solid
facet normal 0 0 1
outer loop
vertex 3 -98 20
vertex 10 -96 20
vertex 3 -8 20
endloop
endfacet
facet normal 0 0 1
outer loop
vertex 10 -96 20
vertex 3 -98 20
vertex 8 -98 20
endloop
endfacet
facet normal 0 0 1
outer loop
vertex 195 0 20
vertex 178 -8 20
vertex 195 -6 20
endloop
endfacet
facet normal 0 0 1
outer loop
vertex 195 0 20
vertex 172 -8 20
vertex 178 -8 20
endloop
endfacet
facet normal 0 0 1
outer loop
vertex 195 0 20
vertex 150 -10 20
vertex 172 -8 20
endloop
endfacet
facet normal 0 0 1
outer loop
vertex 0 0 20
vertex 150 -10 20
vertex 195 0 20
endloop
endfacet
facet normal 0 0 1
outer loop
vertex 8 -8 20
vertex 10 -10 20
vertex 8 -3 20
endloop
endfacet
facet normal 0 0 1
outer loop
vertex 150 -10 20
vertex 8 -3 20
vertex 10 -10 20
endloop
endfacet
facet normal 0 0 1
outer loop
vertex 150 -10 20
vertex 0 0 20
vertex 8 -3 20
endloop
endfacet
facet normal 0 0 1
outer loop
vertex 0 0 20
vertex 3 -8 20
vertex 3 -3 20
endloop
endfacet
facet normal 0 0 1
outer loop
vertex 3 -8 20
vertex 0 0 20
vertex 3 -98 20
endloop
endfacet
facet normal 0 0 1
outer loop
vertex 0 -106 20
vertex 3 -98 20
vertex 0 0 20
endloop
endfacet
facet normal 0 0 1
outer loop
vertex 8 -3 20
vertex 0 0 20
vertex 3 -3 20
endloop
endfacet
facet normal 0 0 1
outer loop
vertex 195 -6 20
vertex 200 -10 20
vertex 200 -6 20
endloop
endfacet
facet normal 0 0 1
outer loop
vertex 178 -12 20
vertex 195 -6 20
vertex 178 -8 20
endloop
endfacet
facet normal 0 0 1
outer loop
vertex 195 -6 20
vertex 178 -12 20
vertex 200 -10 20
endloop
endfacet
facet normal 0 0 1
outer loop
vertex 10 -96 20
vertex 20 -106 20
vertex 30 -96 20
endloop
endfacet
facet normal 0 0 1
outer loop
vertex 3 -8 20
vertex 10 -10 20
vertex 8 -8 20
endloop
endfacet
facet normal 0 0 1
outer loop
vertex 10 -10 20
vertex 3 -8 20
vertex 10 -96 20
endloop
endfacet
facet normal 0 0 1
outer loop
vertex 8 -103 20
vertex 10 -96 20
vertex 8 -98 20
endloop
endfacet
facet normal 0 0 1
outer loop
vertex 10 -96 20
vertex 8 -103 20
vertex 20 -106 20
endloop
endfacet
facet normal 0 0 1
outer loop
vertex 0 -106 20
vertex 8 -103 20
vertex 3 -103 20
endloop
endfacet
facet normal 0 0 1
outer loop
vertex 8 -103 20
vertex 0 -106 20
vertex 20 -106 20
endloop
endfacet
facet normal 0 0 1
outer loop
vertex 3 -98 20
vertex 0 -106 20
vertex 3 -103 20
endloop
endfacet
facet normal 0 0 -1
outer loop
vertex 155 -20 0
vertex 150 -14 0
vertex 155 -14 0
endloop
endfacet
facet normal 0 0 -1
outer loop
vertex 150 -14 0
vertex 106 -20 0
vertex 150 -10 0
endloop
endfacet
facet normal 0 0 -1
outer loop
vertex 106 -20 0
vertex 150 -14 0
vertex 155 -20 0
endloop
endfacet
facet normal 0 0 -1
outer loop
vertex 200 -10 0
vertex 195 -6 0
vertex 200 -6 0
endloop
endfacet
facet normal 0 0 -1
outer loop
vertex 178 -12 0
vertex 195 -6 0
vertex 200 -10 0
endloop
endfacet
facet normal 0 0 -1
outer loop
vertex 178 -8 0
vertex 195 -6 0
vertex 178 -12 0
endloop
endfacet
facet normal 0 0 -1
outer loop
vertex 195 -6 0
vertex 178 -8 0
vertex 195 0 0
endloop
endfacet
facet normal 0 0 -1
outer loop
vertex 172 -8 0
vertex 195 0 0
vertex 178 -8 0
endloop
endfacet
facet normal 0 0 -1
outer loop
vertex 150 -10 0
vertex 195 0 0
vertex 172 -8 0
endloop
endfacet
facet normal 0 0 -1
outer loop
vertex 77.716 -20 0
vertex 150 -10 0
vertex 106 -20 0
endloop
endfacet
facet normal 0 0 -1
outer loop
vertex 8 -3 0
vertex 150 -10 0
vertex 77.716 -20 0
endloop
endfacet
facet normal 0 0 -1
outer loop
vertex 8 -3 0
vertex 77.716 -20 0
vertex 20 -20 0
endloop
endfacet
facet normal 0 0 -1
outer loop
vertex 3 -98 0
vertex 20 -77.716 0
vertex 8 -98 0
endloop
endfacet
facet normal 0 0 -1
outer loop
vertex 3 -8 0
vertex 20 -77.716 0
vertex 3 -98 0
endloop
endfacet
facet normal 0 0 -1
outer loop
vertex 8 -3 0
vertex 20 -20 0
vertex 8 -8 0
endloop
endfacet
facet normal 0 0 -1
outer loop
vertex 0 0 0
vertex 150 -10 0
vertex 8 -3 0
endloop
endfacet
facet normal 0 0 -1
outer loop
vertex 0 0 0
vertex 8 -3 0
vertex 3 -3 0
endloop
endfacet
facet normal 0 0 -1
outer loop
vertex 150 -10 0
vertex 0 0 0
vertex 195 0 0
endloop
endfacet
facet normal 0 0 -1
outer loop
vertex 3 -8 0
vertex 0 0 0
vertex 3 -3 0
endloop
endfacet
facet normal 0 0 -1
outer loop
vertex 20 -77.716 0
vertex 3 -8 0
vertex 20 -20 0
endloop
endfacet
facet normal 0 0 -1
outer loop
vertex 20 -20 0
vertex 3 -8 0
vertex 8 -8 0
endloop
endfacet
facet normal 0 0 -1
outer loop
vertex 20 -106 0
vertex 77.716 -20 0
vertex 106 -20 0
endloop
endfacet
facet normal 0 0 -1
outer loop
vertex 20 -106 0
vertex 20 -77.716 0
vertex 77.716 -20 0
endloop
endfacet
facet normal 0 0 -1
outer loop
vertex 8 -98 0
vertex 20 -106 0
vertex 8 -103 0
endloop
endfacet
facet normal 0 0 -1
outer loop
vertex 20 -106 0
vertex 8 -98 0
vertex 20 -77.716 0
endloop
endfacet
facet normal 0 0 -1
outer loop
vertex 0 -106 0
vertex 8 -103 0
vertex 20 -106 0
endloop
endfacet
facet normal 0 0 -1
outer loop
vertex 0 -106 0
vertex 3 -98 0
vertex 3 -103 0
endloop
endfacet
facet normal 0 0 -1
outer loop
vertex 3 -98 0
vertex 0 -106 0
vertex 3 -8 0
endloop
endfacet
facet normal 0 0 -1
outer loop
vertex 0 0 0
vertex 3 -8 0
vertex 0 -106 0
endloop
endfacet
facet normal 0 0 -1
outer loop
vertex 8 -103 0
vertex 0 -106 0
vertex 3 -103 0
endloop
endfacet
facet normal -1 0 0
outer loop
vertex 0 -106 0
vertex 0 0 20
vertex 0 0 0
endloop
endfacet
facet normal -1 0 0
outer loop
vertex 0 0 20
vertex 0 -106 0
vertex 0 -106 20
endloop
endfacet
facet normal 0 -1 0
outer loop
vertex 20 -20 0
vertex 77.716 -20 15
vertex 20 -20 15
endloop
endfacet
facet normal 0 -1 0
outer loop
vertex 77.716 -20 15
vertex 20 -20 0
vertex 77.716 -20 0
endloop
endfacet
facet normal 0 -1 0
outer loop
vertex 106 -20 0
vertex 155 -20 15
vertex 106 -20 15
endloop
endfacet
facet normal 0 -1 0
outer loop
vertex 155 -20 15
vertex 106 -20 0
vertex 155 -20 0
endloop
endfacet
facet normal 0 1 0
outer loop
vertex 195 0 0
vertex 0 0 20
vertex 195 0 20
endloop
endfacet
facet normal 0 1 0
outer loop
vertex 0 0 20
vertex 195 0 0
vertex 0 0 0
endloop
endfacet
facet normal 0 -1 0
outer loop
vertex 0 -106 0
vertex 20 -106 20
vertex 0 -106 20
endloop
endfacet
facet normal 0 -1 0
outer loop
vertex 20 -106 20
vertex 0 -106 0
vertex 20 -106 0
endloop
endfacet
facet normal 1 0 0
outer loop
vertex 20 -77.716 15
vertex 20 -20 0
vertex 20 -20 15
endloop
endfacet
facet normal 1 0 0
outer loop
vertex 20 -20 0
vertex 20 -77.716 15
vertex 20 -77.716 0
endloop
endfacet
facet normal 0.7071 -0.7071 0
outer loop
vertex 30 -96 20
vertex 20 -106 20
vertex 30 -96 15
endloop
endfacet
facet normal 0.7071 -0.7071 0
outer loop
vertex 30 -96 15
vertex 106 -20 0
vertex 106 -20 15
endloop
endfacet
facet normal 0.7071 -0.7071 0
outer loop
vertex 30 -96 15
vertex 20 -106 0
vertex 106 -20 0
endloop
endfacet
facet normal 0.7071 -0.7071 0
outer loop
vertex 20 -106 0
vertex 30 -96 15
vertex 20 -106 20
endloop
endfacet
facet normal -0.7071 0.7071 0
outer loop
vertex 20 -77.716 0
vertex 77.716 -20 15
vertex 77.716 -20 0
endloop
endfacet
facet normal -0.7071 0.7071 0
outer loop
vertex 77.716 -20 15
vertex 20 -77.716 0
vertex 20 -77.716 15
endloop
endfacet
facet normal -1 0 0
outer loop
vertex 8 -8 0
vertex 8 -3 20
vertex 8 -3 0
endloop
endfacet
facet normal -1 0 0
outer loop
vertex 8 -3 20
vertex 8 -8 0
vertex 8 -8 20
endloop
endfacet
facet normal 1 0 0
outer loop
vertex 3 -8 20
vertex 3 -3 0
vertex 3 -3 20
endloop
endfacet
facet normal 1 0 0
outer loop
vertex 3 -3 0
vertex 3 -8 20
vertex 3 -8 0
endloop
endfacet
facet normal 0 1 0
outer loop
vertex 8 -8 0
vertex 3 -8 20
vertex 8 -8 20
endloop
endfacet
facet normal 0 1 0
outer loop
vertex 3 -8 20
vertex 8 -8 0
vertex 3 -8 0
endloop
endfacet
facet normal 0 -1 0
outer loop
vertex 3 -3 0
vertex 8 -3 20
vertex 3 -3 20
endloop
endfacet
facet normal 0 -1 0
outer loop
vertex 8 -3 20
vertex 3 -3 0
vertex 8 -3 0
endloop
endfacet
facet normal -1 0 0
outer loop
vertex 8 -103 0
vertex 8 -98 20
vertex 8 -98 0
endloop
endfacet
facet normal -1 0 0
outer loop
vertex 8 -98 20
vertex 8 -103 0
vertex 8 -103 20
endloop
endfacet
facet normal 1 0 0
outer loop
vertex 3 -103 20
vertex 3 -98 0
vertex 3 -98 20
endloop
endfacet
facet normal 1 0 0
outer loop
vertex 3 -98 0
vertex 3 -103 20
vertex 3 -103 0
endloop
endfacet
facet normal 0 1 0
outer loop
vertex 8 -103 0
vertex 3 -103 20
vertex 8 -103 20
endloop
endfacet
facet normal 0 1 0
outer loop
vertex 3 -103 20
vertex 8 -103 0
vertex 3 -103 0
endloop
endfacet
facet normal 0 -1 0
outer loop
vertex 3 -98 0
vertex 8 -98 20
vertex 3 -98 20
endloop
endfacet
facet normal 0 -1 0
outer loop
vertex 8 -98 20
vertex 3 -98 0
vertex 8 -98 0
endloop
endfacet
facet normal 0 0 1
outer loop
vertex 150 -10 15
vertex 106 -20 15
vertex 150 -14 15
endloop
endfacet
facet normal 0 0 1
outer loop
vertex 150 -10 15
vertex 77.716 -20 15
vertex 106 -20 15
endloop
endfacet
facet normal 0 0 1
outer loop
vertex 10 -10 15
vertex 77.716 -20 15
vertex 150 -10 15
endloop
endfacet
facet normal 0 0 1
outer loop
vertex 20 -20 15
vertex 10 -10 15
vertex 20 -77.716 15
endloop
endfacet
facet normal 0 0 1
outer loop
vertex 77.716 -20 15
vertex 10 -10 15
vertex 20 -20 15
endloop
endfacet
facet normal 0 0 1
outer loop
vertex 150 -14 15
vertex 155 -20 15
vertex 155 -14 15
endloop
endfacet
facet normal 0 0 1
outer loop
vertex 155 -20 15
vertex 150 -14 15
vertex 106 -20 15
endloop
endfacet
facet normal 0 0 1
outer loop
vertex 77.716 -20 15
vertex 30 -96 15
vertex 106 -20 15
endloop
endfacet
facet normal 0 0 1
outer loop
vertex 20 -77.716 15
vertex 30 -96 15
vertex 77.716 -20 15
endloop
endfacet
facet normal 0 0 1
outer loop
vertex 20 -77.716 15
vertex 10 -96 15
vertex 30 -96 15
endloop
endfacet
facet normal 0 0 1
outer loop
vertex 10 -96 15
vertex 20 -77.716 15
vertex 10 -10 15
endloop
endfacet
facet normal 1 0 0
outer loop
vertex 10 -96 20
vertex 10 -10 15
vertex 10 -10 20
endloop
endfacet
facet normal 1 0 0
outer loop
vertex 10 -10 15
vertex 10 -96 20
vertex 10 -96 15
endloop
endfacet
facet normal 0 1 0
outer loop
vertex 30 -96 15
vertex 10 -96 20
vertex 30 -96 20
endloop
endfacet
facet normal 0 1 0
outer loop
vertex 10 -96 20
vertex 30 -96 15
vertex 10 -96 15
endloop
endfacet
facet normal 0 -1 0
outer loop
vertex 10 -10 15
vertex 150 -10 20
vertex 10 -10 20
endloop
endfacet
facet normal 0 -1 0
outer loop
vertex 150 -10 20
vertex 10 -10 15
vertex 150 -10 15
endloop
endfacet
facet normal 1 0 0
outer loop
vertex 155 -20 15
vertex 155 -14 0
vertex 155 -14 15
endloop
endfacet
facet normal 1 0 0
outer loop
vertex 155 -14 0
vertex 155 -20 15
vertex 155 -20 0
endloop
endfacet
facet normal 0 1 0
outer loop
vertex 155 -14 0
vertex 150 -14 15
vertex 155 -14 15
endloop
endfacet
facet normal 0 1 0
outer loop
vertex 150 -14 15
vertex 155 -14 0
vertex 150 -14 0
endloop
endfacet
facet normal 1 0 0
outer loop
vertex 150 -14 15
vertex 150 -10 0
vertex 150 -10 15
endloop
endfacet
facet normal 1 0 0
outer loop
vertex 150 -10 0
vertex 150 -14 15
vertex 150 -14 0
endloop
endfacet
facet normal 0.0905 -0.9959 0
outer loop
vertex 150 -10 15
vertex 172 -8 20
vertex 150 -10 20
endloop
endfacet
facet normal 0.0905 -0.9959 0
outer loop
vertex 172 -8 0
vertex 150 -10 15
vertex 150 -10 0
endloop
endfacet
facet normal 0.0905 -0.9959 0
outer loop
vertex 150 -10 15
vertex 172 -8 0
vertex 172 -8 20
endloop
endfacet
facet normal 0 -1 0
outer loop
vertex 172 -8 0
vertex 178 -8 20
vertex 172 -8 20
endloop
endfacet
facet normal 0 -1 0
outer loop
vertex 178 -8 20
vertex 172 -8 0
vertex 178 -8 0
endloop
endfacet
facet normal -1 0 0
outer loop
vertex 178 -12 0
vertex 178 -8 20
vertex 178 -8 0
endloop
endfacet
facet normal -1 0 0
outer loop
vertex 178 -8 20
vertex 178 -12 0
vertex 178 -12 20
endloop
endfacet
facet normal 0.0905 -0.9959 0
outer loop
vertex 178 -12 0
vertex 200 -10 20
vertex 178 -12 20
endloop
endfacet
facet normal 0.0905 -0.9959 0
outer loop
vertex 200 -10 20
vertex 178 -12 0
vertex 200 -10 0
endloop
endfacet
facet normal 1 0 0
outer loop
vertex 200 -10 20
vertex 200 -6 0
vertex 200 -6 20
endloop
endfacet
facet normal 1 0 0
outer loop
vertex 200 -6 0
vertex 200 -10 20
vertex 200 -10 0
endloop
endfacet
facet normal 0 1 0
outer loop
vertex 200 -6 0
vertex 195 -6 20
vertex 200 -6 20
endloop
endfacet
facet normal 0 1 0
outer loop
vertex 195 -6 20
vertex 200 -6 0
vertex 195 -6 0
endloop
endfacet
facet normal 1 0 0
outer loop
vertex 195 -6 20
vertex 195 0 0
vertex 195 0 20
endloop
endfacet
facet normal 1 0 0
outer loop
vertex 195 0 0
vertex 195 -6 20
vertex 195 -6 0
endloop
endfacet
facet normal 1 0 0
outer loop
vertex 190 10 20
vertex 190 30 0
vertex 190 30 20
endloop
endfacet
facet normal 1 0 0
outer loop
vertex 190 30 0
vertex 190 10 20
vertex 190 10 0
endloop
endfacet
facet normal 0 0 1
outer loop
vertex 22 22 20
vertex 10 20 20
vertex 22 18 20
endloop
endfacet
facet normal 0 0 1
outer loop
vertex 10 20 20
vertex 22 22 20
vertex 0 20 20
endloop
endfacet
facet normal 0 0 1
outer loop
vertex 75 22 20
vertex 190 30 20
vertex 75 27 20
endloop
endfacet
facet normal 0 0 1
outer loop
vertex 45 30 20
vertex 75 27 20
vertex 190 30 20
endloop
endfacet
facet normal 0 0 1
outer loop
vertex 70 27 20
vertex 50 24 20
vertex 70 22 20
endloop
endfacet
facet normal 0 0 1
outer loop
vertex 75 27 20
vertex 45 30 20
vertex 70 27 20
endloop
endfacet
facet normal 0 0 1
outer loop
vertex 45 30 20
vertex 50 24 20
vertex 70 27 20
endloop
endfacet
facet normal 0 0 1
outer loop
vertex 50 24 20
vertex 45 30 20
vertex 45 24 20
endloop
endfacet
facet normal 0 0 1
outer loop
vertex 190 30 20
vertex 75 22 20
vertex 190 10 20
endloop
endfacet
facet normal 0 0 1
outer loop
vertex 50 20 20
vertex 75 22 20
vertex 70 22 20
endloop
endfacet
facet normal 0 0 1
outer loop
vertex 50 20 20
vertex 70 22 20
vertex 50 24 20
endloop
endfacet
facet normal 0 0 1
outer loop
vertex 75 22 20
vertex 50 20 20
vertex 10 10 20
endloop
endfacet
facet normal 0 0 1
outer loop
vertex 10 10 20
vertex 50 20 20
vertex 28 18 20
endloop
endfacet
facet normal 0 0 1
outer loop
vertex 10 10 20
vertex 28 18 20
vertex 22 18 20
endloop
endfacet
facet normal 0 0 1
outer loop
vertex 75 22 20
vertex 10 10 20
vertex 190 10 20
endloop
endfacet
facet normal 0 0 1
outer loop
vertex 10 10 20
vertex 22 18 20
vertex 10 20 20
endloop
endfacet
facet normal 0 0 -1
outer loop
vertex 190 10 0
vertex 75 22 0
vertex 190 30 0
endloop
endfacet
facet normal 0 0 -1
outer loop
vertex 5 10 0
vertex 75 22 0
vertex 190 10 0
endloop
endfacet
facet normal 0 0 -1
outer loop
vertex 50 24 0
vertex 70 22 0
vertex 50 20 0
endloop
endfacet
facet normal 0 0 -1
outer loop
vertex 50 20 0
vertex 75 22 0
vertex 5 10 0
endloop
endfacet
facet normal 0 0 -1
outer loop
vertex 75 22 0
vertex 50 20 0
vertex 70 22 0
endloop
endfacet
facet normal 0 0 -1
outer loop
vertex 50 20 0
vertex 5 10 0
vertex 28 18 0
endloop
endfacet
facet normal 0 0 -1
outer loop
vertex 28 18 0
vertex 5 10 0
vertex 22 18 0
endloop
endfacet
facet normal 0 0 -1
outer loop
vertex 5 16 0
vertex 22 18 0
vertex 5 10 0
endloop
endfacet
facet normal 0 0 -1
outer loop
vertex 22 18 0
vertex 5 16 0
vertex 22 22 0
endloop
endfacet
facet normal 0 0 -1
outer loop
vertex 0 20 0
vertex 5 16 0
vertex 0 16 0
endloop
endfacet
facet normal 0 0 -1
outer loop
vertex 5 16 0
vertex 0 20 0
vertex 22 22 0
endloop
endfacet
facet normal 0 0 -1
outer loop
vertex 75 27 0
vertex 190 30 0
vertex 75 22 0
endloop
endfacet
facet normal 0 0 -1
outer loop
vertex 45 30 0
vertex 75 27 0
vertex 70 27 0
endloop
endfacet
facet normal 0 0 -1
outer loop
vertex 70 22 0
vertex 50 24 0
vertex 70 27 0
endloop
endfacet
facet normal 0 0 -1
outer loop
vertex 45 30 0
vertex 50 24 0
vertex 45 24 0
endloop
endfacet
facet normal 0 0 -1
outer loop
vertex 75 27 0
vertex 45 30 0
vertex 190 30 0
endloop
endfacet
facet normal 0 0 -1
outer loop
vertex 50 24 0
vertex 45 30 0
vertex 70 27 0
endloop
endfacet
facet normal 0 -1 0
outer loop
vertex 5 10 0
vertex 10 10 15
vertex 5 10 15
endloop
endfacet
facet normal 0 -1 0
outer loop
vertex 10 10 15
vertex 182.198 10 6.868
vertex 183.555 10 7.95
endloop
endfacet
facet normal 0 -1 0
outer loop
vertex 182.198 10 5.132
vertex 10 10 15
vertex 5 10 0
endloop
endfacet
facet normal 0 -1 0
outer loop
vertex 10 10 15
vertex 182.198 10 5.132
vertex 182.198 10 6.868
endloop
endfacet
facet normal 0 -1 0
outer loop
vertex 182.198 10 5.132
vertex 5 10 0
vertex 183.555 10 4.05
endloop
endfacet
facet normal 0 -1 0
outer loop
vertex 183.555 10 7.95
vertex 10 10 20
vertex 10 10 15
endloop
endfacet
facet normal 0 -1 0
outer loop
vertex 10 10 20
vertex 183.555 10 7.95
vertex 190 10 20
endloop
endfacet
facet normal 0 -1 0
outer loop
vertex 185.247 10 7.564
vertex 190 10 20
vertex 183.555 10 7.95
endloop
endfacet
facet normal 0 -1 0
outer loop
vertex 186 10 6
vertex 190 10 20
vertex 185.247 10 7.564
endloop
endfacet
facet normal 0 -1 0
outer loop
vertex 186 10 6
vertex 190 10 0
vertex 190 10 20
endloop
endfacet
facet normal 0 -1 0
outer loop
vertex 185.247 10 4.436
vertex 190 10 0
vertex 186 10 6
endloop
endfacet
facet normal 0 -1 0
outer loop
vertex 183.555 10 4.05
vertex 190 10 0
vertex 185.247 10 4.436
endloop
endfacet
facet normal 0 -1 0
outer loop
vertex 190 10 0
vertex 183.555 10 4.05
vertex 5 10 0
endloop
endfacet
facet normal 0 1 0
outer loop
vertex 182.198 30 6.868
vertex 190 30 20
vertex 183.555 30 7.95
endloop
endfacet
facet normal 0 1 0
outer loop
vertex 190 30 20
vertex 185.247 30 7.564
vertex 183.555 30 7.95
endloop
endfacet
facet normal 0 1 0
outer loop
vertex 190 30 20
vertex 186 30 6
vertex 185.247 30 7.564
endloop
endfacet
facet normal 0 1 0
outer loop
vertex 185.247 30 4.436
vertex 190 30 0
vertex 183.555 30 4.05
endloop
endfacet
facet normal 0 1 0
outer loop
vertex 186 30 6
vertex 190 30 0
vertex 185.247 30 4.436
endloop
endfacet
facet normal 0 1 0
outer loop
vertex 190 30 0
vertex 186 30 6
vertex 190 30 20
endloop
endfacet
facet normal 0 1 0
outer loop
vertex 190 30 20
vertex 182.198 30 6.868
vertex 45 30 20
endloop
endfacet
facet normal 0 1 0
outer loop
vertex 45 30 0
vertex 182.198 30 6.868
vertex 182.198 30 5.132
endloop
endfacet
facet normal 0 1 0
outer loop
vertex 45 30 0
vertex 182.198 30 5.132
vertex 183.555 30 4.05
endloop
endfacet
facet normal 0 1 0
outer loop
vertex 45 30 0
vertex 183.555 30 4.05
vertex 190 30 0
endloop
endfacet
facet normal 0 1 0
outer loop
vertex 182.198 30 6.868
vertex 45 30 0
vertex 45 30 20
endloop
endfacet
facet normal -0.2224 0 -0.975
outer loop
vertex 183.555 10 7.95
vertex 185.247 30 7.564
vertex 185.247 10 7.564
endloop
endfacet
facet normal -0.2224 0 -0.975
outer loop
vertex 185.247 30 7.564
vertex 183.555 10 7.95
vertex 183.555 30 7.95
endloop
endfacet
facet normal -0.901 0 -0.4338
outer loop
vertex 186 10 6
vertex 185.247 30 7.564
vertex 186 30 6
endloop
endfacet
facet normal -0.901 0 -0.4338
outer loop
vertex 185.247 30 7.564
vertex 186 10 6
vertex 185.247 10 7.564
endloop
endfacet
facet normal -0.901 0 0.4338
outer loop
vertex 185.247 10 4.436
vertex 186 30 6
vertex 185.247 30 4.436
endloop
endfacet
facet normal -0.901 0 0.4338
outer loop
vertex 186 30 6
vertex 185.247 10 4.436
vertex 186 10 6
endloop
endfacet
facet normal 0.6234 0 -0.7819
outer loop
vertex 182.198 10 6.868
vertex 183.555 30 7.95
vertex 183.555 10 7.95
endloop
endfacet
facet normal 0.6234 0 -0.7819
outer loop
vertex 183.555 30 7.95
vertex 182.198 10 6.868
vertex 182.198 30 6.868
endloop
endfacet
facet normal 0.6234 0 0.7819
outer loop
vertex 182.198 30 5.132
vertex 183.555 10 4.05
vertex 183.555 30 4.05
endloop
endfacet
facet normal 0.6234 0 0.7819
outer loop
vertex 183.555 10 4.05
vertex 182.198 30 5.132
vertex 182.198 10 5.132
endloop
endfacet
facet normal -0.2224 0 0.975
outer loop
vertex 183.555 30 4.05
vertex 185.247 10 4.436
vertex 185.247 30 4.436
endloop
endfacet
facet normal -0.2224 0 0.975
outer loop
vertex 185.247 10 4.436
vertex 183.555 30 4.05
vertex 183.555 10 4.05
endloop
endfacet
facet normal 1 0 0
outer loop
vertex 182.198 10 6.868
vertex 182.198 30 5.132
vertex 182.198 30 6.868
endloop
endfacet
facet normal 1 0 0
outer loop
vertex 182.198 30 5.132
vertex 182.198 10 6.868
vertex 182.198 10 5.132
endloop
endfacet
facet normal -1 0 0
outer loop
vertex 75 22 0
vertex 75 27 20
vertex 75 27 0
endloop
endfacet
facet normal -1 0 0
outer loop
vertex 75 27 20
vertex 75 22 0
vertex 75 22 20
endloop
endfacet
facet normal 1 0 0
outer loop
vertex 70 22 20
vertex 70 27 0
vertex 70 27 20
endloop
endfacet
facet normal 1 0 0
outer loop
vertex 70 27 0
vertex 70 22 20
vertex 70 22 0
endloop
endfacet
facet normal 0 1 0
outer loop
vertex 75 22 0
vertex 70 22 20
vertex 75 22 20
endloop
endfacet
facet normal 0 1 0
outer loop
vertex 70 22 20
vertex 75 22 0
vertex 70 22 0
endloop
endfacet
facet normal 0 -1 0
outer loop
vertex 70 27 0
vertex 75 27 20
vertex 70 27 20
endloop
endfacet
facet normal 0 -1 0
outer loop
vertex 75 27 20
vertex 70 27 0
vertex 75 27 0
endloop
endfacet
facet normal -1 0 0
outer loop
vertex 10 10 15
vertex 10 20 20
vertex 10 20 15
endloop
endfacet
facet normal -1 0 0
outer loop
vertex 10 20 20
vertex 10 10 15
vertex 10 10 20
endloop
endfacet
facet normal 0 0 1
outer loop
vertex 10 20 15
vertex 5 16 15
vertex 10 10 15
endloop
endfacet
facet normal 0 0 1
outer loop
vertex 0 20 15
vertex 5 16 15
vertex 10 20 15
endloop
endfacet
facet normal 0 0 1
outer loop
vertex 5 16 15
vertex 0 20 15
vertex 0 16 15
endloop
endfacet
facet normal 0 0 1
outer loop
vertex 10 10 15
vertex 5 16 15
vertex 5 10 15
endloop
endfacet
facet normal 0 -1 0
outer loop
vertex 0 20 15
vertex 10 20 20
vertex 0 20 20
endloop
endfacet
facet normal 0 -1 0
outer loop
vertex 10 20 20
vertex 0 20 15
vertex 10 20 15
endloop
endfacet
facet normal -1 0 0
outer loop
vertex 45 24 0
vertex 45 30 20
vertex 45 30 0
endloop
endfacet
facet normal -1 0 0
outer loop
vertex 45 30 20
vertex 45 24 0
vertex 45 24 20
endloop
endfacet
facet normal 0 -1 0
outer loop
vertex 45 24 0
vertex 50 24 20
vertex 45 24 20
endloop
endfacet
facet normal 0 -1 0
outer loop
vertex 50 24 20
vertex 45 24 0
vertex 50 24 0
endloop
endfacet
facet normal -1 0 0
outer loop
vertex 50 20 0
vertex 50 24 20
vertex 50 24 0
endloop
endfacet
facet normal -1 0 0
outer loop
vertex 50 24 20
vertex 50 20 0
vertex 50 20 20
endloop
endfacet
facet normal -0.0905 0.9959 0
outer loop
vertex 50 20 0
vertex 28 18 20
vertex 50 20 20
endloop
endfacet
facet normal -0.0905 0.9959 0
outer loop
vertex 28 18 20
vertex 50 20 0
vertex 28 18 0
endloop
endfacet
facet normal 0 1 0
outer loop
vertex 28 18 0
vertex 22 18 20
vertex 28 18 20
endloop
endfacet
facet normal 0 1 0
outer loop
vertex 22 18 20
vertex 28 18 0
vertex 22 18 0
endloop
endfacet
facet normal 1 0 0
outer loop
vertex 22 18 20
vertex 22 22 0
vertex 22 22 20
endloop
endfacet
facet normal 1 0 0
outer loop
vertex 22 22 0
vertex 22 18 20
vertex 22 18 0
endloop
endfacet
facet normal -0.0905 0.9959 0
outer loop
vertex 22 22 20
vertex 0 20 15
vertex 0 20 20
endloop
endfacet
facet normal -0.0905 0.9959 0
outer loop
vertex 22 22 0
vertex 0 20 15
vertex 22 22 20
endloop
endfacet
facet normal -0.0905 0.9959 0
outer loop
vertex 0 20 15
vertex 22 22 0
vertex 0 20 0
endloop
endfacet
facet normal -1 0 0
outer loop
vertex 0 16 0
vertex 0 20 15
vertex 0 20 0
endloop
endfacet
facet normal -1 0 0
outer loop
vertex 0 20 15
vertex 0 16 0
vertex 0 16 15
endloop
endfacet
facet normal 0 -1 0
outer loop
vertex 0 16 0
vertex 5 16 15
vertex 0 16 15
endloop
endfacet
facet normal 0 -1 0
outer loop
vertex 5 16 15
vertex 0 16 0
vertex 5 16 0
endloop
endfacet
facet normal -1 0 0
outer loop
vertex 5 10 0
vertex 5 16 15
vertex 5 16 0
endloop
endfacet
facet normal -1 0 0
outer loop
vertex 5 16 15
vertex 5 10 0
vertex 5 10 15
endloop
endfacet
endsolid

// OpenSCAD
module kanawa(){
	linear_extrude(21){polygon([[0,0],[0,45],[10-4,45],[10-4,50],[10,50],[10+2,25+3],[10-2,25+3],[10-2,25-3],[10,.0001],[10+4,.0001],[10+4,5],[20,5],[20,0],[0,0]]);}
}

module main(){

difference(){
	union(){
		cube([340,20,20]);
		translate([0,86,0])cube([20,20,20]);
		translate([0,10,0])cube([20,86,20]);
		translate([20-20/sqrt(2),86+20-20/sqrt(2),0])rotate(-45)cube([86*sqrt(2),20,20]);
	}
	translate([3,3,0])cube([5,5,100]);
	translate([3,86+10+5-3,0])cube([5,5,100]);
	translate([220,3,0])cube([5,5,100]);

	translate([10,10,15])cube([150,86,140]);
	translate([170,25,0])union(){
		cube([170,10,170]);
		translate([170-6,0,6])rotate([90,0,0])cylinder(d=4,h=100,center=true);
	}
}
}
scale([1,-1,1])print();

module print(){
intersection(){
	main();union(){
cube(150);
translate([150,0,0])rotate([0,0,-90])scale([-1,1,1])kanawa();}
}

translate([-150,-30,0])intersection(){
	main();union(){
	translate([200,0,0])cube(150);
	translate([200,20,20])rotate([180,0,-90])scale(1)kanawa();}
}
}
